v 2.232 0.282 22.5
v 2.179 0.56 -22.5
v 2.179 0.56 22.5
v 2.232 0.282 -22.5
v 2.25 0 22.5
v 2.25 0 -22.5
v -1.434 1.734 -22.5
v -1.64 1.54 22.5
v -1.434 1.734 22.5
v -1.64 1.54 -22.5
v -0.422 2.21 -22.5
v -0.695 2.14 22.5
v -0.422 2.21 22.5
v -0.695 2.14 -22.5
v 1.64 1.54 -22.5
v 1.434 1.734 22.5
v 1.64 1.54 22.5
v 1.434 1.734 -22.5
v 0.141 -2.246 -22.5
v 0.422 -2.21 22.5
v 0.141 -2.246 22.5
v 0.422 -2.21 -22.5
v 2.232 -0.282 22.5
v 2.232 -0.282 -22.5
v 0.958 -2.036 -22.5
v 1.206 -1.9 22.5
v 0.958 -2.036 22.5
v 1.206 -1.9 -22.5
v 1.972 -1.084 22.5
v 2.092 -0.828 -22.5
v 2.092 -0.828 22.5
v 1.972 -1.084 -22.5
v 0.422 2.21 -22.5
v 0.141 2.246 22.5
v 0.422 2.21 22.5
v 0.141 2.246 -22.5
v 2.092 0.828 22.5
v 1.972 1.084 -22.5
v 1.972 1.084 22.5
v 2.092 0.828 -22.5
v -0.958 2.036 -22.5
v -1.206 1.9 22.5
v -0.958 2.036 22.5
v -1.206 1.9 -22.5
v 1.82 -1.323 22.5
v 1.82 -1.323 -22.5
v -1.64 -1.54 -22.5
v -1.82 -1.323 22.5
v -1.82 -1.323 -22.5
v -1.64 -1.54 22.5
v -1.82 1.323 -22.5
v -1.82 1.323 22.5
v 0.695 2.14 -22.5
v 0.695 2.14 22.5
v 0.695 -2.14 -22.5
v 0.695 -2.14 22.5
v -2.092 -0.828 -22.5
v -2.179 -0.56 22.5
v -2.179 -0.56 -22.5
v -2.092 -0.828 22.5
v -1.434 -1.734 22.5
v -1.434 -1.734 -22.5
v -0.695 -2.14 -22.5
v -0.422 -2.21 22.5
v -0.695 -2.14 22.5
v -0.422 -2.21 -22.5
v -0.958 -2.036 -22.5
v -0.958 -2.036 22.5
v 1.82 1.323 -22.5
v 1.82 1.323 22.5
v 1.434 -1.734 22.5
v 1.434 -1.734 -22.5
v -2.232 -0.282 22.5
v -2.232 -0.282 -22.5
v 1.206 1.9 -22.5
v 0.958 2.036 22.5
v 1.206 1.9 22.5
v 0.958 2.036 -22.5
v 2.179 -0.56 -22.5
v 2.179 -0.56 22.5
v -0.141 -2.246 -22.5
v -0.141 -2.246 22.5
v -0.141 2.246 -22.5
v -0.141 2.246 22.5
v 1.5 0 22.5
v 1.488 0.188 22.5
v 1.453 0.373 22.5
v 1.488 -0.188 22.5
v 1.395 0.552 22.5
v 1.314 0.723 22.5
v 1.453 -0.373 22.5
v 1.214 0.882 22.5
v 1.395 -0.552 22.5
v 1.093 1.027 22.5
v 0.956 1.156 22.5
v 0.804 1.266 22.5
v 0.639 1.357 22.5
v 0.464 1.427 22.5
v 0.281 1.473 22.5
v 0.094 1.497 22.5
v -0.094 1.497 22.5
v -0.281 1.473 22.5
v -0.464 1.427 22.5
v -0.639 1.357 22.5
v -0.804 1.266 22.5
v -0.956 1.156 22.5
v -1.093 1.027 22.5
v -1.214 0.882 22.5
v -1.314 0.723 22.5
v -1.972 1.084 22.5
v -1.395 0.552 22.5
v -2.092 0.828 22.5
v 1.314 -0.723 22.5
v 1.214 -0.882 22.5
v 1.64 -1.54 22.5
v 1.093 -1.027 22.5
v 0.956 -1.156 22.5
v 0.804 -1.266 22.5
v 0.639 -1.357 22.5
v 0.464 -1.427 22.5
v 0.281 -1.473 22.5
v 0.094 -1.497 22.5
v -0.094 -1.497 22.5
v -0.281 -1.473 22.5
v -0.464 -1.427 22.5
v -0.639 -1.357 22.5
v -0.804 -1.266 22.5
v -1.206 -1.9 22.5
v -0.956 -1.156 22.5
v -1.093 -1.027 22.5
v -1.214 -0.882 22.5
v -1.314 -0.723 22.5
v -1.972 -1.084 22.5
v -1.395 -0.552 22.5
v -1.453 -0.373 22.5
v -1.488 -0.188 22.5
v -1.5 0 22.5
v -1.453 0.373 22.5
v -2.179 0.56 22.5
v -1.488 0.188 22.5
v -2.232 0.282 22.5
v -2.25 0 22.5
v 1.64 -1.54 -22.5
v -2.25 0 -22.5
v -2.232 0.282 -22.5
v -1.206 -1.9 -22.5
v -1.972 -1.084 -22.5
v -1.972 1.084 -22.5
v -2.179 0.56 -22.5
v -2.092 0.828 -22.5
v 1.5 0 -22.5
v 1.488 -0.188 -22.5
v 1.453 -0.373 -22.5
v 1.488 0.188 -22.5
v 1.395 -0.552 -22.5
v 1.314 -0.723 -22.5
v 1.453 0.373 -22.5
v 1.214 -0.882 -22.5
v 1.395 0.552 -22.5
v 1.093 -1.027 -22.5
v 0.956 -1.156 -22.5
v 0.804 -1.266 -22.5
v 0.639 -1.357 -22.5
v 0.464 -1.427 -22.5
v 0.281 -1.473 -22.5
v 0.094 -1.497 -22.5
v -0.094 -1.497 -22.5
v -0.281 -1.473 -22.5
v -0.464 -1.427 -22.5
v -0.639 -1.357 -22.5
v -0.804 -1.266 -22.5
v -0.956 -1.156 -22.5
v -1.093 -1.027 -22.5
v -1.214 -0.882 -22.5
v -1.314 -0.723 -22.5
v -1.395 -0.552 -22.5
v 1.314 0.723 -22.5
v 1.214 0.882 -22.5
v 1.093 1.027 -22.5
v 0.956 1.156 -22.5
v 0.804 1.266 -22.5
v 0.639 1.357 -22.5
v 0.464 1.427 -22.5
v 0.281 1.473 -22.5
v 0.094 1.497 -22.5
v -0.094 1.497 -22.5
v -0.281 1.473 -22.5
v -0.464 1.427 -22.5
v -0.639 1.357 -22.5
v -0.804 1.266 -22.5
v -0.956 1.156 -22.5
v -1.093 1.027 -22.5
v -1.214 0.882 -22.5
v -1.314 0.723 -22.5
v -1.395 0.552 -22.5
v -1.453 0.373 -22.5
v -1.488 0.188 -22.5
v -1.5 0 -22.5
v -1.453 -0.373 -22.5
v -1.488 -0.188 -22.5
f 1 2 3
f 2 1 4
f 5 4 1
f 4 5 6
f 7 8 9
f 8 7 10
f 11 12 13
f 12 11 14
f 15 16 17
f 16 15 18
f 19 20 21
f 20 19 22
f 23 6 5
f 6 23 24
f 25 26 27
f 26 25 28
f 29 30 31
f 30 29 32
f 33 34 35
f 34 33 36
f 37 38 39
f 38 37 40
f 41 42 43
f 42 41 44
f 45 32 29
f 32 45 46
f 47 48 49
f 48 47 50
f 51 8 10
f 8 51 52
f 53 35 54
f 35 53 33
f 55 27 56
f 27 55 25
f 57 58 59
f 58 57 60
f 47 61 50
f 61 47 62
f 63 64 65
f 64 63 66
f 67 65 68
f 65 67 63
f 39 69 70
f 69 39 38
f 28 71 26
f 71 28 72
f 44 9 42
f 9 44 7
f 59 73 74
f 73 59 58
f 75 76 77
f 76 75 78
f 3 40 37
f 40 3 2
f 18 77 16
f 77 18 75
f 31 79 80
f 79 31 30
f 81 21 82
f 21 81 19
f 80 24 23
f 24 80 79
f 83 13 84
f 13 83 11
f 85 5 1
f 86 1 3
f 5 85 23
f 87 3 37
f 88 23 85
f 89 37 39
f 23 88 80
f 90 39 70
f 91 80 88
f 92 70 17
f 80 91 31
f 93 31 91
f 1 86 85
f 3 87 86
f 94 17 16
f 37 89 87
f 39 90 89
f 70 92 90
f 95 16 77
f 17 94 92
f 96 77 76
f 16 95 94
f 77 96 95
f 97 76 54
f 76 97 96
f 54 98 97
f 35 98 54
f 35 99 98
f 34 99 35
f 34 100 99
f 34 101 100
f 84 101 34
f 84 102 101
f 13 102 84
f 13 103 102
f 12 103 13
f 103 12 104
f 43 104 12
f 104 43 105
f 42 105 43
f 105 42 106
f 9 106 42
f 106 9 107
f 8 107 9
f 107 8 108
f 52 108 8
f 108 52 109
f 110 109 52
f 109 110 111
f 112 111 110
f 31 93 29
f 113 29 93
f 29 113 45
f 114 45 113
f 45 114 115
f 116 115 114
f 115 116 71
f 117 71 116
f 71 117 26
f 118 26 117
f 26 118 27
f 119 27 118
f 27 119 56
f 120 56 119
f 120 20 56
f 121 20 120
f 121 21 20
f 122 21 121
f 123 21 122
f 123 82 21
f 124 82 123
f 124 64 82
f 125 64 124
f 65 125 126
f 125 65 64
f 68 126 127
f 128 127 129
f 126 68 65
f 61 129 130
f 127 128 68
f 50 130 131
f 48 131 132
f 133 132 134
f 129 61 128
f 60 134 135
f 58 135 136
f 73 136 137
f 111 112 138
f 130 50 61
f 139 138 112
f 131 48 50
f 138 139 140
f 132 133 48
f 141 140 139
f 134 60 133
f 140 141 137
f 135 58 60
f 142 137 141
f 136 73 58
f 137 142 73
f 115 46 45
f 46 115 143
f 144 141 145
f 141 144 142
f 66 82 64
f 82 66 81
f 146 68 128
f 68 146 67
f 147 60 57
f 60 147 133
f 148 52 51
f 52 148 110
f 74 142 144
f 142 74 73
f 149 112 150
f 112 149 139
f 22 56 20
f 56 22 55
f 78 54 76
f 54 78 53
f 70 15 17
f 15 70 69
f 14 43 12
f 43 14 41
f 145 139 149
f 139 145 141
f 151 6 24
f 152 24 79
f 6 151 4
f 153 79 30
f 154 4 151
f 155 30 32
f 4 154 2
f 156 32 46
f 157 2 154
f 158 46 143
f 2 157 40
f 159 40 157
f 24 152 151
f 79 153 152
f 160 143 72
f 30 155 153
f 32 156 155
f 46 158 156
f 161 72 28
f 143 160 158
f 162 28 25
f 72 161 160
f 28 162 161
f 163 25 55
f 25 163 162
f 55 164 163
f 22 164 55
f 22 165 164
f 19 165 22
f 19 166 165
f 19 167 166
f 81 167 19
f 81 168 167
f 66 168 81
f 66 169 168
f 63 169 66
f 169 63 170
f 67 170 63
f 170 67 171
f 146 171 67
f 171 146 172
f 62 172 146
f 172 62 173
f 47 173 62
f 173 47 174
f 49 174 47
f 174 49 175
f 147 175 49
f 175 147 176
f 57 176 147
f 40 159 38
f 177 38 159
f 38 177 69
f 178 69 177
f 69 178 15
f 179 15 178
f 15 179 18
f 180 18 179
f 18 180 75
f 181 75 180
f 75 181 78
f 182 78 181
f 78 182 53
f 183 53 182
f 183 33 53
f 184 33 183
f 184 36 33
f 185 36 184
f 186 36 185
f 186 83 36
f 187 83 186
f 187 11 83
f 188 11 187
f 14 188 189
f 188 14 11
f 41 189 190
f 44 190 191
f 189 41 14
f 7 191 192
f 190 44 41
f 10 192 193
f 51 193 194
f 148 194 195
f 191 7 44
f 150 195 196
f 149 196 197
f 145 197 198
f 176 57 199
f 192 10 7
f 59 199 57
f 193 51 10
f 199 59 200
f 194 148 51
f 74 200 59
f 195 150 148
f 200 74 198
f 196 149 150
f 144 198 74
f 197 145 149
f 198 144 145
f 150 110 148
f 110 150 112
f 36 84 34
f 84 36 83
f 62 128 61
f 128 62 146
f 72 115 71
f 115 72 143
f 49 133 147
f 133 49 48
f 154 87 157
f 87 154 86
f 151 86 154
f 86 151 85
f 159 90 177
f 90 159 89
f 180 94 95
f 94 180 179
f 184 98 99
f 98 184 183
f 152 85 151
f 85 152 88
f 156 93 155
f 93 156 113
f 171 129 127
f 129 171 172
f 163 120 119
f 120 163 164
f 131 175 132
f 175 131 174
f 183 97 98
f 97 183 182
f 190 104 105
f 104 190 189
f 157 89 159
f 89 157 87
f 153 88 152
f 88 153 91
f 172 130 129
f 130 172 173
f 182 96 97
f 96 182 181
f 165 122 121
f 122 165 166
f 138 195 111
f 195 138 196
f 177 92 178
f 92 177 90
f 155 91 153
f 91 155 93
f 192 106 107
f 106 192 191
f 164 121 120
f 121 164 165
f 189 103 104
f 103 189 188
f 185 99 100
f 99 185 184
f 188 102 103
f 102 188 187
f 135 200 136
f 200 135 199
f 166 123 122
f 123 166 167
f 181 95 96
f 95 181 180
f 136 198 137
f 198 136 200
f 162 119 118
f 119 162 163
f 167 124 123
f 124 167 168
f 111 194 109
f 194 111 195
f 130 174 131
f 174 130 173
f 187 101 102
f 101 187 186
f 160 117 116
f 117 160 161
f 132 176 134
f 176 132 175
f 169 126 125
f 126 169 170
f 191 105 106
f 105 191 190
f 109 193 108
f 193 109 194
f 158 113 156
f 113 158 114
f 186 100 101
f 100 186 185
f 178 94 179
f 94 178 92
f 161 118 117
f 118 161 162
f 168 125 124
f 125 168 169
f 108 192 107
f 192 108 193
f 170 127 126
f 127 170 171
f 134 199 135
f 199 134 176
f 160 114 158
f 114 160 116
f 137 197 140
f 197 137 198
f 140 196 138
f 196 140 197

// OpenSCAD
$fn = 50;


difference() {
	union() {
		translate(v = [0, 0, -22.5000000000]) {
			cylinder(h = 45, r = 2.2500000000);
		}
	}
	union() {
		translate(v = [0, 0, -100.0000000000]) {
			cylinder(h = 200, r = 1.5000000000);
		}
	}
}
